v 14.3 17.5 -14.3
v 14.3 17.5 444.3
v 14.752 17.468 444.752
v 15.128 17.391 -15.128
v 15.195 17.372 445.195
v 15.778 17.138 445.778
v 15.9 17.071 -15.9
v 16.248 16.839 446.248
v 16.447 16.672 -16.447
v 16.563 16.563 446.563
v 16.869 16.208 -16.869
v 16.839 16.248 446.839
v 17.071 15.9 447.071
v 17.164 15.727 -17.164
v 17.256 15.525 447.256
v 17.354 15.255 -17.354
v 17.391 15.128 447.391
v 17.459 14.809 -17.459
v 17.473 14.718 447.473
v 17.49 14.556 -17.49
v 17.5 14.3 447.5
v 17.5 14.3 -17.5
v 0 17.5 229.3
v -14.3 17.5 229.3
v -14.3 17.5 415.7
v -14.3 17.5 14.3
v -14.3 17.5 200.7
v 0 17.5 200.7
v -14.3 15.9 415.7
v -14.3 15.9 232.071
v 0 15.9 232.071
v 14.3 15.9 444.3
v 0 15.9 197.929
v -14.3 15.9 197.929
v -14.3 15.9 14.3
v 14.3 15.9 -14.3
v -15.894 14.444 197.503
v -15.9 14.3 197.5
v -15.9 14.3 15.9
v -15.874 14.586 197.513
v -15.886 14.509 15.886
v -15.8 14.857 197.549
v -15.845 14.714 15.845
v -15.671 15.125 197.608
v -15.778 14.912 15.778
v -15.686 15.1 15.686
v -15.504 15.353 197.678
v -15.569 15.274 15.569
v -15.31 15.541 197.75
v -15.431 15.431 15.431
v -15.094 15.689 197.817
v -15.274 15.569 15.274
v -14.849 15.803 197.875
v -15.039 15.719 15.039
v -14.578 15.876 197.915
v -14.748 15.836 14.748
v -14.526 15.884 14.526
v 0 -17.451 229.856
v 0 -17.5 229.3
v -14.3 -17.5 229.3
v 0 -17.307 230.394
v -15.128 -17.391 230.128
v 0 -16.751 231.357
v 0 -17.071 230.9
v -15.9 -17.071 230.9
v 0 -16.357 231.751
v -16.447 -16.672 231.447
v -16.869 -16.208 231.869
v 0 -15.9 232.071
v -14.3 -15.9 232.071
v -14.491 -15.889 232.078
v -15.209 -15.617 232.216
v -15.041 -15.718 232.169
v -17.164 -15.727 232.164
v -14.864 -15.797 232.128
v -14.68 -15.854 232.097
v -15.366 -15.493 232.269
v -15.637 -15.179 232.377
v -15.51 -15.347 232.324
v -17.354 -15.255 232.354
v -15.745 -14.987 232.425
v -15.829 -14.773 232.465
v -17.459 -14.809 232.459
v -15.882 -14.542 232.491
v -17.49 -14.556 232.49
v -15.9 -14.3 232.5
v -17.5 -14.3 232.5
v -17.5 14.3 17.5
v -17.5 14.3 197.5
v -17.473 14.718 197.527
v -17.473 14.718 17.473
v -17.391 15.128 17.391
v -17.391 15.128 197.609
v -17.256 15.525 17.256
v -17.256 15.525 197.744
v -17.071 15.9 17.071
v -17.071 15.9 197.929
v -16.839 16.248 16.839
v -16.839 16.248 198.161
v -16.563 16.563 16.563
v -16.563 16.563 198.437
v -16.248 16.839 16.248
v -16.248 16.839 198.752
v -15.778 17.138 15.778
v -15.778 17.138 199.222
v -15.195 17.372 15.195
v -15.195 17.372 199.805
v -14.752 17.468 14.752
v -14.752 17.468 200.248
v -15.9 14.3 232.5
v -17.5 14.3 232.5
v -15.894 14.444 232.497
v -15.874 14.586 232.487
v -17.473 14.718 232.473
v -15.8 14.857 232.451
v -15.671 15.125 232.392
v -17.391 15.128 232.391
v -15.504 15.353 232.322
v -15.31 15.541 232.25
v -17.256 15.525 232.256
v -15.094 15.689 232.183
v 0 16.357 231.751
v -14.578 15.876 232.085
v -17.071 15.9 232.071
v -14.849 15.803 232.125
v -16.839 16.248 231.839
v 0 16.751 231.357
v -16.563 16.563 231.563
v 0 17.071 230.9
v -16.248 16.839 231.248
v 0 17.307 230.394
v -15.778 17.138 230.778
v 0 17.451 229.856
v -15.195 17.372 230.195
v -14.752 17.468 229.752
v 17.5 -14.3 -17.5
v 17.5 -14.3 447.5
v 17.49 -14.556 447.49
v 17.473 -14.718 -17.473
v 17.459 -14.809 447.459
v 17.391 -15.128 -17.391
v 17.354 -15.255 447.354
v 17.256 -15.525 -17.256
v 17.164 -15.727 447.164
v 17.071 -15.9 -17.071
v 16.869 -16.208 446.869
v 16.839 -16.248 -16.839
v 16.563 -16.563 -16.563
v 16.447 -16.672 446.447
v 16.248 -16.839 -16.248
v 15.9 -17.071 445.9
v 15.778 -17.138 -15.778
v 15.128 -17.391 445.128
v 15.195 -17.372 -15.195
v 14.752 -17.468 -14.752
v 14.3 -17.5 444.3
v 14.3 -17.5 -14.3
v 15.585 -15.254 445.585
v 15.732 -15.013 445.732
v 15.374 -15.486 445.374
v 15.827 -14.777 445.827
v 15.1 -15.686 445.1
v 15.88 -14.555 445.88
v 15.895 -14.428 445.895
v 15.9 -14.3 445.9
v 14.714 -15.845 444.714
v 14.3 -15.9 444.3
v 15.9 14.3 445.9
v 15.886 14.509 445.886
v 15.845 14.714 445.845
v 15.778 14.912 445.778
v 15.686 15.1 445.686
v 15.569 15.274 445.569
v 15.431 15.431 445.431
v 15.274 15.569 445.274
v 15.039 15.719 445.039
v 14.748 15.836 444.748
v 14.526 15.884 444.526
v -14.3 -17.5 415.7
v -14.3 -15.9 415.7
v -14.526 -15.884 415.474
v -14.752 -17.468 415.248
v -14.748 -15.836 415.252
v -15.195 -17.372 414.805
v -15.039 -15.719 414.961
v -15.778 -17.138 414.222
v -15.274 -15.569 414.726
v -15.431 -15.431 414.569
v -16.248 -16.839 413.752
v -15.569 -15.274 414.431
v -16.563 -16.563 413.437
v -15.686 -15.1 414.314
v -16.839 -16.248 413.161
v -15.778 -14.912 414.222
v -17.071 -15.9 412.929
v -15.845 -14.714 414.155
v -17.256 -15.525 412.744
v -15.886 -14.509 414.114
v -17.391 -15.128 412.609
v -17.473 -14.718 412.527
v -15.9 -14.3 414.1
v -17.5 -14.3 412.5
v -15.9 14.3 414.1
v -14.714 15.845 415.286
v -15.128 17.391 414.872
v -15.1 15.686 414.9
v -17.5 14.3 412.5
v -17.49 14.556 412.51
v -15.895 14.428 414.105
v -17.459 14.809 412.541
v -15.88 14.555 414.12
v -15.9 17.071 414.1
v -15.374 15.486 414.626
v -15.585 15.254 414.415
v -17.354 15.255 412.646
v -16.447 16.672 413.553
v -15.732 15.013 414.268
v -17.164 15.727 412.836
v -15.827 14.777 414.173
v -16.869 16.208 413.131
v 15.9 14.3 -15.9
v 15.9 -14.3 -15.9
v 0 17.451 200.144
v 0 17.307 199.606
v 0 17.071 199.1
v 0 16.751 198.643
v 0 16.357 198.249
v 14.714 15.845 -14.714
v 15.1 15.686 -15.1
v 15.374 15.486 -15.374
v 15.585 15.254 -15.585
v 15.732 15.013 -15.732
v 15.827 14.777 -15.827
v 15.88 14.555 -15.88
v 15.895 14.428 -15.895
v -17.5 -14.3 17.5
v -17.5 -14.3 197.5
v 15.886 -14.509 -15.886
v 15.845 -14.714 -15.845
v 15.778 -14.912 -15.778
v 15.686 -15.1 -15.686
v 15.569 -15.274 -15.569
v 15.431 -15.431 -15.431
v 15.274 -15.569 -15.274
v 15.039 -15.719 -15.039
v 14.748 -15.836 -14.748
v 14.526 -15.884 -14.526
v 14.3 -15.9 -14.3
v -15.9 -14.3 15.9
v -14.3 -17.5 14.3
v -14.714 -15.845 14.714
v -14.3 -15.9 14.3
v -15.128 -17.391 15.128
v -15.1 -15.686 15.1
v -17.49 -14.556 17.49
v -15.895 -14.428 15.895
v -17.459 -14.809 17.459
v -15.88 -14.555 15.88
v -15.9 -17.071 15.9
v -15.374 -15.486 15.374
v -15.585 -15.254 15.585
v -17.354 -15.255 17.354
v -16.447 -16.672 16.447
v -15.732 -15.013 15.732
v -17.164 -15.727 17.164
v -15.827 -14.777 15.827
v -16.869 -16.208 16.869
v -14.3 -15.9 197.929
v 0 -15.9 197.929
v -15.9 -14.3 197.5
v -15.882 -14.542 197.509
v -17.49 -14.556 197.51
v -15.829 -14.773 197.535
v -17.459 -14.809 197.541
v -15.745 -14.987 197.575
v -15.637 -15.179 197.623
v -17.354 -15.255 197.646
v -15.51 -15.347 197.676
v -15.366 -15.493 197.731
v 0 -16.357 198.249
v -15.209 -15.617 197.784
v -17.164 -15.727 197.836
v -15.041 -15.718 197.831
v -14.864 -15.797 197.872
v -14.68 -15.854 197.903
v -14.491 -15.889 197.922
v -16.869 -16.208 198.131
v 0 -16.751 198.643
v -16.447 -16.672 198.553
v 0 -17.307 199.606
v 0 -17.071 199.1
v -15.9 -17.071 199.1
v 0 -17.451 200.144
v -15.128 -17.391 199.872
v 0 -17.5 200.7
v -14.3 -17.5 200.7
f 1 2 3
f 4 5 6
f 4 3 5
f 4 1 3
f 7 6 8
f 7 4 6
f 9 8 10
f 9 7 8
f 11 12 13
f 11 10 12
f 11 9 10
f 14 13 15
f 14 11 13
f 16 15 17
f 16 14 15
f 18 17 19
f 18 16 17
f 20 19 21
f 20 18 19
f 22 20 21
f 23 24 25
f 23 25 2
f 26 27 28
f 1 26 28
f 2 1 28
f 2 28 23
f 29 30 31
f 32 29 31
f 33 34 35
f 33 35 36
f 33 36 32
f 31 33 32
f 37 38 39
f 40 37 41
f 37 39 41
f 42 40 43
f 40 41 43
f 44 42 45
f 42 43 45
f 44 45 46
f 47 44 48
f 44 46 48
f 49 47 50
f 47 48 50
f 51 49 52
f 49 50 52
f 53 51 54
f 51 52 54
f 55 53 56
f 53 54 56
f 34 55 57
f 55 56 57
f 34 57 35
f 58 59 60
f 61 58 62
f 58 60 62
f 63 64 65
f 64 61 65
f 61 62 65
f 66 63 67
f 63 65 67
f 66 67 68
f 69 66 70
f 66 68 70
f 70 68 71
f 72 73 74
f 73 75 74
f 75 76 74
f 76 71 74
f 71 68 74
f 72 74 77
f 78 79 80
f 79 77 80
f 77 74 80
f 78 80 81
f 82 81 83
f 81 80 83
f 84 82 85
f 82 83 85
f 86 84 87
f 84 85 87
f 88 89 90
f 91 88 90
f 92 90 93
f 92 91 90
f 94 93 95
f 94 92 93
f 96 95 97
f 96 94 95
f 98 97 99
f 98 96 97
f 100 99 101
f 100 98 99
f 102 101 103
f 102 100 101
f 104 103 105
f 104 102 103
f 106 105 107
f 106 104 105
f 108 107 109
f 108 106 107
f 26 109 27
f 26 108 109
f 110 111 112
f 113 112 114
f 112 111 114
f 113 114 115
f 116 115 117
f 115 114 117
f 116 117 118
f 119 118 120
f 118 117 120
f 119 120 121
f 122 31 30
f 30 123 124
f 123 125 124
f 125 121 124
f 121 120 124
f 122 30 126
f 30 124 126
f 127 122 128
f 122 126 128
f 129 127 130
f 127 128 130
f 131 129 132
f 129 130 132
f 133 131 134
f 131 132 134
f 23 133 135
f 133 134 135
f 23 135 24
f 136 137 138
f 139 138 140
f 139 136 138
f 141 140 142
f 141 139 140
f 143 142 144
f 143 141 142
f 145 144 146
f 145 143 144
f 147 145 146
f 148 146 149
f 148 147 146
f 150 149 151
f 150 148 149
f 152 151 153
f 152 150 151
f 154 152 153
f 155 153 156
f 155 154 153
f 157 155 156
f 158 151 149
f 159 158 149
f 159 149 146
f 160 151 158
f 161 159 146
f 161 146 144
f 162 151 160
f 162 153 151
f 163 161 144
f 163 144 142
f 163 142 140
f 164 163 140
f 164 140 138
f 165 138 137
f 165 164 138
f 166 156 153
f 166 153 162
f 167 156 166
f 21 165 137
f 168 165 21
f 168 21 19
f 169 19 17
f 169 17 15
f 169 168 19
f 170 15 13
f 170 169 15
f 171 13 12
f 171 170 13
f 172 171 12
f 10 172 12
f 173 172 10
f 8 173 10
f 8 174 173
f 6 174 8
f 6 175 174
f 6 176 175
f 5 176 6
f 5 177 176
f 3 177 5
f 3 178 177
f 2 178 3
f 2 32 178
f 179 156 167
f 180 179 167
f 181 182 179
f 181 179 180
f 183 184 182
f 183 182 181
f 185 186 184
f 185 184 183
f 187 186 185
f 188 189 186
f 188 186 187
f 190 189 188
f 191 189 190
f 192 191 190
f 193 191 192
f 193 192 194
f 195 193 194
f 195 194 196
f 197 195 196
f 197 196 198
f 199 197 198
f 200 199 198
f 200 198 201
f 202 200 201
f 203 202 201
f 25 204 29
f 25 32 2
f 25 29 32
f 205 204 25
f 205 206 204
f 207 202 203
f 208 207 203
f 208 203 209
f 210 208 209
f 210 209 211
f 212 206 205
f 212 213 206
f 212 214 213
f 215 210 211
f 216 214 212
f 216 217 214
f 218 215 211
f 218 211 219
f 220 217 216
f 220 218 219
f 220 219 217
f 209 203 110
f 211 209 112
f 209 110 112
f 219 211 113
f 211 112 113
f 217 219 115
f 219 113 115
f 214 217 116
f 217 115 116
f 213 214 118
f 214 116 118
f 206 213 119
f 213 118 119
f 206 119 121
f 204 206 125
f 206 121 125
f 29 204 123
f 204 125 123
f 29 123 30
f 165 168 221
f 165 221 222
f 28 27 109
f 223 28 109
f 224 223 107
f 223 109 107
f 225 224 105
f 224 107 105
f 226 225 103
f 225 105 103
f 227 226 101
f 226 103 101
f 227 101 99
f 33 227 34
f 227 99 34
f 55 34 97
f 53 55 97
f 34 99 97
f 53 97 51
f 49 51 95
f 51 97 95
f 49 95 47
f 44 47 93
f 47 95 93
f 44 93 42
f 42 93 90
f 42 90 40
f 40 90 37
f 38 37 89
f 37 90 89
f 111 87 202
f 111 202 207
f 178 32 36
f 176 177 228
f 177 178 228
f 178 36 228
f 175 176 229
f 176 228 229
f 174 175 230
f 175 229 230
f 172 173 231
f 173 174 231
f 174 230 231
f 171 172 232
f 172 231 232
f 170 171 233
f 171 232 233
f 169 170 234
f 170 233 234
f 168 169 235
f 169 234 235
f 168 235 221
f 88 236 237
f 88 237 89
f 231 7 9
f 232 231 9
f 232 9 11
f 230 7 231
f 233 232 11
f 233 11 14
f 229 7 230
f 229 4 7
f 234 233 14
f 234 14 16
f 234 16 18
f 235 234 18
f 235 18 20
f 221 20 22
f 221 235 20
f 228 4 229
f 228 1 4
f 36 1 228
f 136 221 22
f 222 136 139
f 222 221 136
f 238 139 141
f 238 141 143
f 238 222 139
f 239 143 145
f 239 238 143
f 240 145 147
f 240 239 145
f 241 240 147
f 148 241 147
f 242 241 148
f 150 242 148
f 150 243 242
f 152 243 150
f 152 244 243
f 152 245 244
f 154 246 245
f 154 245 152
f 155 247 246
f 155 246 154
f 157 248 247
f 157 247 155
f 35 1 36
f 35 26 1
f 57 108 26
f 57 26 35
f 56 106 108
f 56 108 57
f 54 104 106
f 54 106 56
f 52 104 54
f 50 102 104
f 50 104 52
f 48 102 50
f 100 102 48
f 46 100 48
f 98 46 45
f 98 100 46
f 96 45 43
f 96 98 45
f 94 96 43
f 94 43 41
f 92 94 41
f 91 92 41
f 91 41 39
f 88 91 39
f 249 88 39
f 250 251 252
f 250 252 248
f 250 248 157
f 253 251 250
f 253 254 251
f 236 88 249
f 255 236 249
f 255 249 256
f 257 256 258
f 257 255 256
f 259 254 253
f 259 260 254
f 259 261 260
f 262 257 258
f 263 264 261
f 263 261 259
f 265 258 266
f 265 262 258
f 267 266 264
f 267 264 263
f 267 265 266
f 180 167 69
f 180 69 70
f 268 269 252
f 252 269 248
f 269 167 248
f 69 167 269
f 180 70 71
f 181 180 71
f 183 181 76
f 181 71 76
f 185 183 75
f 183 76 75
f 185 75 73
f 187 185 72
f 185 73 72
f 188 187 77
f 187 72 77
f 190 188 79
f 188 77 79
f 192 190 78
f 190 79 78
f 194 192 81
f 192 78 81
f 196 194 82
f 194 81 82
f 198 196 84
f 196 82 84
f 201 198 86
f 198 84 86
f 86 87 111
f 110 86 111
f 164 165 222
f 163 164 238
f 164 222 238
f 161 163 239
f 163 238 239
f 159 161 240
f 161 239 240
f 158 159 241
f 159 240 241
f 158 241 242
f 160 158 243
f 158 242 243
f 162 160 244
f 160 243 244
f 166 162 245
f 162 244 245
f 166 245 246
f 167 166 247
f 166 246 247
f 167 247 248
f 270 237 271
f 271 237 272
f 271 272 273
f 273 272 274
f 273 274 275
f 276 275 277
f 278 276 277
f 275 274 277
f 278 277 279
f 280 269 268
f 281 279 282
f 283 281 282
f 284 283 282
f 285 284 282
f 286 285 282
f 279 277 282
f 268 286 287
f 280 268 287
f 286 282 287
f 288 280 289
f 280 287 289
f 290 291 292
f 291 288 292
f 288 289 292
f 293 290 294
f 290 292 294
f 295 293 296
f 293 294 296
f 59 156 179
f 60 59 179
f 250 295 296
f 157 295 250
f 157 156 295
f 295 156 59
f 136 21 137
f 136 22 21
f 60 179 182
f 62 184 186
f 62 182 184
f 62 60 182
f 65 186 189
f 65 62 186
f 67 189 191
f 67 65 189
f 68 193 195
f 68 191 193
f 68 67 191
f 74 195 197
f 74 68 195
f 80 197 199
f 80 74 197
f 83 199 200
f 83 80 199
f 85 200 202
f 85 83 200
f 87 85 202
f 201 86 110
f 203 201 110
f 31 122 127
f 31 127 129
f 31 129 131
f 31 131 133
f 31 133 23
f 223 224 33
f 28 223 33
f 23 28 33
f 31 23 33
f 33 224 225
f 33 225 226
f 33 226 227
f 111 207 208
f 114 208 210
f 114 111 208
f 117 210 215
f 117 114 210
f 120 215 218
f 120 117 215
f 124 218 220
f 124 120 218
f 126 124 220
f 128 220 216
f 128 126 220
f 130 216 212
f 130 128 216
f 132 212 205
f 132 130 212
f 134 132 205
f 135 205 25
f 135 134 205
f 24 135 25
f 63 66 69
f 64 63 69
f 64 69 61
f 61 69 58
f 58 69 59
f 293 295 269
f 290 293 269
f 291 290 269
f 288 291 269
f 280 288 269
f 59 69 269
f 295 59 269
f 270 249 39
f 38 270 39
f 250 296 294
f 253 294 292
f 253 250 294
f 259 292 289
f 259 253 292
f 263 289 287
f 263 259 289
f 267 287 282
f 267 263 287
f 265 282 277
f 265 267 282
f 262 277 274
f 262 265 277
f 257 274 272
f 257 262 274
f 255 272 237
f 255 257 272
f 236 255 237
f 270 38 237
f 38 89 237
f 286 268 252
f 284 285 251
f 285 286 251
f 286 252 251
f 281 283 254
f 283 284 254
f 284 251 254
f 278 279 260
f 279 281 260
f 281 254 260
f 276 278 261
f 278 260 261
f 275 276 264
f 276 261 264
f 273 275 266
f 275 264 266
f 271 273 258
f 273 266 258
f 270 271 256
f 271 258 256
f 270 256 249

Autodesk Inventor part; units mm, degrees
ref_plane "Start plane" through (0, 0, -17.5) normal (0, 0, 1) x (1, 0, 0)
ref_plane "End plane" through (0, 0, 447.5) normal (0, 0, 1) x (1, 0, 0)
sketch "Sketch" plane through (0, 0, 0) normal (0, 0, 1) x (1, 0, 0)
  line L0 (-17.5, -14.3) -> (-17.5, 14.3)
  line L1 (-14.3, 17.5) -> (14.3, 17.5)
  line L2 (17.5, 14.3) -> (17.5, -14.3)
  line L3 (14.3, -17.5) -> (-14.3, -17.5)
  arc A0 (-17.5, -14.3) -> (-14.3, -17.5) centre (-14.3, -14.3) ccw
  arc A1 (-14.3, 17.5) -> (-17.5, 14.3) centre (-14.3, 14.3) ccw
  arc A2 (17.5, 14.3) -> (14.3, 17.5) centre (14.3, 14.3) ccw
  arc A3 (14.3, -17.5) -> (17.5, -14.3) centre (14.3, -14.3) ccw
  arc A4 (-14.3, 15.9) -> (-15.9, 14.3) centre (-14.3, 14.3) ccw
  line L4 (-14.3, 15.9) -> (14.3, 15.9)
  arc A5 (15.9, 14.3) -> (14.3, 15.9) centre (14.3, 14.3) ccw
  line L5 (15.9, 14.3) -> (15.9, -14.3)
  arc A6 (14.3, -15.9) -> (15.9, -14.3) centre (14.3, -14.3) ccw
  line L6 (14.3, -15.9) -> (-14.3, -15.9)
  arc A7 (-15.9, -14.3) -> (-14.3, -15.9) centre (-14.3, -14.3) ccw
  line L7 (-15.9, -14.3) -> (-15.9, 14.3)
  line L8 (0, 25.4278) -> (0, -25.4278) construction
  line L9 (-25.4278, 0) -> (25.4278, 0) construction
  dimension "d7" = 3.2
  dimension "d10" = 35
  dimension "d11" = 35
  dimension "d12" = 1.6
  dimension "d15" = 17.5
  dimension "d16" = 17.5
extrude "Body" add sketch "Sketch" along normal up to surface (465 mm away) from surface at -17.5
sketch "Sketch3" plane through (0, 0, 0) normal (0, 0, 1) x (1, 0, 0)
  line L0 (0, 0) -> (10, 0)
ref_plane "Work Plane3" through (0, 0, 0) normal (0, -1, 0) x (1, 0, 0)
sketch "Sketch4" plane through (0, 0, 0) normal (0, -1, 0) x (1, 0, 0)
  line L0 (-2, -17.5) -> (12, -17.5)
  line L1 (-2, 447.5) -> (12, 447.5)
  dimension "d18" = 465
ref_plane "Work Plane4" through (17.5, 0, 447.5) normal (-0.7071, 0, 0.7071) x (0.7071, 0, 0.7071)
split "Split1" plane through (17.5, 0, 447.5) removes the side toward (-0.7071, 0, 0.7071)
ref_plane "Work Plane5" through (17.5, 0, -17.5) normal (-0.7071, 0, -0.7071) x (-0.7071, 0, 0.7071)
split "Split2" plane through (17.5, 0, -17.5) removes the side toward (-0.7071, 0, -0.7071)
ref_plane "Work Plane6" through (-730, 0, 215) normal (1, 0, 0) x (0, 0, -1)
ref_plane "Work Plane7" through (0, 0, 215) normal (1, 0, 0) x (0, 0, -1)
ref_plane "Work Plane8" through (-365, 0, 215) normal (1, 0, 0) x (0, 0, -1)
sketch "Sketch5" plane through (-365, 0, 215) normal (1, 0, 0) x (0, 0, -1)
  arc A0 (-17.5, -14.3) -> (-14.3, -17.5) centre (-14.3, -14.3) ccw
  line L0 (-17.5, -14.3) -> (-17.5, 14.3)
  arc A1 (-14.3, 17.5) -> (-17.5, 14.3) centre (-14.3, 14.3) ccw
  line L1 (-14.3, 17.5) -> (14.3, 17.5)
  arc A2 (17.5, 14.3) -> (14.3, 17.5) centre (14.3, 14.3) ccw
  line L2 (17.5, 14.3) -> (17.5, -14.3)
  arc A3 (14.3, -17.5) -> (17.5, -14.3) centre (14.3, -14.3) ccw
  line L3 (14.3, -17.5) -> (-14.3, -17.5)
  arc A4 (-14.3, 15.9) -> (-15.9, 14.3) centre (-14.3, 14.3) ccw
  line L4 (-14.3, 15.9) -> (14.3, 15.9)
  arc A5 (15.9, 14.3) -> (14.3, 15.9) centre (14.3, 14.3) ccw
  line L5 (15.9, 14.3) -> (15.9, -14.3)
  arc A6 (14.3, -15.9) -> (15.9, -14.3) centre (14.3, -14.3) ccw
  line L6 (14.3, -15.9) -> (-14.3, -15.9)
  arc A7 (-15.9, -14.3) -> (-14.3, -15.9) centre (-14.3, -14.3) ccw
  line L7 (-15.9, -14.3) -> (-15.9, 14.3)
extrude "Extrusion2" cut sketch "Sketch5" along normal up to surface (730 mm away) from surface at -365 contours L0 A1 L1 A2 L2 A3 L3 A0 | L4 A5 L5 A6 L6 A7 L7 A4
equation "\"d7\" = G_IR"
equation "\"d10\" = G_H"
equation "\"d11\" = G_W"
equation "\"d12\" = G_T"
equation "\"d15\" = 0.5 * d10"
equation "\"d16\" = 0.5 * d11"
equation "\"d3\" = G_L"
equation "\"G_W\" = 35"
equation "\"G_H\" = 35"
equation "\"G_T\" = 1.6"
equation "\"G_IR\" = 3.2"
equation "\"G_L\" = d18"
equation "\"G_OFFSET_START\" = 17.5"
equation "\"G_OFFSET_END\" = 17.5"
equation "\"d13\" = -G_OFFSET_START"
equation "\"d14\" = G_OFFSET_END + B_L"
equation "\"B_L\" = 430"
properties part number "AS 1163 - C350L0 35x35x1.6 SHS - 465" material "Steel, Mild"
